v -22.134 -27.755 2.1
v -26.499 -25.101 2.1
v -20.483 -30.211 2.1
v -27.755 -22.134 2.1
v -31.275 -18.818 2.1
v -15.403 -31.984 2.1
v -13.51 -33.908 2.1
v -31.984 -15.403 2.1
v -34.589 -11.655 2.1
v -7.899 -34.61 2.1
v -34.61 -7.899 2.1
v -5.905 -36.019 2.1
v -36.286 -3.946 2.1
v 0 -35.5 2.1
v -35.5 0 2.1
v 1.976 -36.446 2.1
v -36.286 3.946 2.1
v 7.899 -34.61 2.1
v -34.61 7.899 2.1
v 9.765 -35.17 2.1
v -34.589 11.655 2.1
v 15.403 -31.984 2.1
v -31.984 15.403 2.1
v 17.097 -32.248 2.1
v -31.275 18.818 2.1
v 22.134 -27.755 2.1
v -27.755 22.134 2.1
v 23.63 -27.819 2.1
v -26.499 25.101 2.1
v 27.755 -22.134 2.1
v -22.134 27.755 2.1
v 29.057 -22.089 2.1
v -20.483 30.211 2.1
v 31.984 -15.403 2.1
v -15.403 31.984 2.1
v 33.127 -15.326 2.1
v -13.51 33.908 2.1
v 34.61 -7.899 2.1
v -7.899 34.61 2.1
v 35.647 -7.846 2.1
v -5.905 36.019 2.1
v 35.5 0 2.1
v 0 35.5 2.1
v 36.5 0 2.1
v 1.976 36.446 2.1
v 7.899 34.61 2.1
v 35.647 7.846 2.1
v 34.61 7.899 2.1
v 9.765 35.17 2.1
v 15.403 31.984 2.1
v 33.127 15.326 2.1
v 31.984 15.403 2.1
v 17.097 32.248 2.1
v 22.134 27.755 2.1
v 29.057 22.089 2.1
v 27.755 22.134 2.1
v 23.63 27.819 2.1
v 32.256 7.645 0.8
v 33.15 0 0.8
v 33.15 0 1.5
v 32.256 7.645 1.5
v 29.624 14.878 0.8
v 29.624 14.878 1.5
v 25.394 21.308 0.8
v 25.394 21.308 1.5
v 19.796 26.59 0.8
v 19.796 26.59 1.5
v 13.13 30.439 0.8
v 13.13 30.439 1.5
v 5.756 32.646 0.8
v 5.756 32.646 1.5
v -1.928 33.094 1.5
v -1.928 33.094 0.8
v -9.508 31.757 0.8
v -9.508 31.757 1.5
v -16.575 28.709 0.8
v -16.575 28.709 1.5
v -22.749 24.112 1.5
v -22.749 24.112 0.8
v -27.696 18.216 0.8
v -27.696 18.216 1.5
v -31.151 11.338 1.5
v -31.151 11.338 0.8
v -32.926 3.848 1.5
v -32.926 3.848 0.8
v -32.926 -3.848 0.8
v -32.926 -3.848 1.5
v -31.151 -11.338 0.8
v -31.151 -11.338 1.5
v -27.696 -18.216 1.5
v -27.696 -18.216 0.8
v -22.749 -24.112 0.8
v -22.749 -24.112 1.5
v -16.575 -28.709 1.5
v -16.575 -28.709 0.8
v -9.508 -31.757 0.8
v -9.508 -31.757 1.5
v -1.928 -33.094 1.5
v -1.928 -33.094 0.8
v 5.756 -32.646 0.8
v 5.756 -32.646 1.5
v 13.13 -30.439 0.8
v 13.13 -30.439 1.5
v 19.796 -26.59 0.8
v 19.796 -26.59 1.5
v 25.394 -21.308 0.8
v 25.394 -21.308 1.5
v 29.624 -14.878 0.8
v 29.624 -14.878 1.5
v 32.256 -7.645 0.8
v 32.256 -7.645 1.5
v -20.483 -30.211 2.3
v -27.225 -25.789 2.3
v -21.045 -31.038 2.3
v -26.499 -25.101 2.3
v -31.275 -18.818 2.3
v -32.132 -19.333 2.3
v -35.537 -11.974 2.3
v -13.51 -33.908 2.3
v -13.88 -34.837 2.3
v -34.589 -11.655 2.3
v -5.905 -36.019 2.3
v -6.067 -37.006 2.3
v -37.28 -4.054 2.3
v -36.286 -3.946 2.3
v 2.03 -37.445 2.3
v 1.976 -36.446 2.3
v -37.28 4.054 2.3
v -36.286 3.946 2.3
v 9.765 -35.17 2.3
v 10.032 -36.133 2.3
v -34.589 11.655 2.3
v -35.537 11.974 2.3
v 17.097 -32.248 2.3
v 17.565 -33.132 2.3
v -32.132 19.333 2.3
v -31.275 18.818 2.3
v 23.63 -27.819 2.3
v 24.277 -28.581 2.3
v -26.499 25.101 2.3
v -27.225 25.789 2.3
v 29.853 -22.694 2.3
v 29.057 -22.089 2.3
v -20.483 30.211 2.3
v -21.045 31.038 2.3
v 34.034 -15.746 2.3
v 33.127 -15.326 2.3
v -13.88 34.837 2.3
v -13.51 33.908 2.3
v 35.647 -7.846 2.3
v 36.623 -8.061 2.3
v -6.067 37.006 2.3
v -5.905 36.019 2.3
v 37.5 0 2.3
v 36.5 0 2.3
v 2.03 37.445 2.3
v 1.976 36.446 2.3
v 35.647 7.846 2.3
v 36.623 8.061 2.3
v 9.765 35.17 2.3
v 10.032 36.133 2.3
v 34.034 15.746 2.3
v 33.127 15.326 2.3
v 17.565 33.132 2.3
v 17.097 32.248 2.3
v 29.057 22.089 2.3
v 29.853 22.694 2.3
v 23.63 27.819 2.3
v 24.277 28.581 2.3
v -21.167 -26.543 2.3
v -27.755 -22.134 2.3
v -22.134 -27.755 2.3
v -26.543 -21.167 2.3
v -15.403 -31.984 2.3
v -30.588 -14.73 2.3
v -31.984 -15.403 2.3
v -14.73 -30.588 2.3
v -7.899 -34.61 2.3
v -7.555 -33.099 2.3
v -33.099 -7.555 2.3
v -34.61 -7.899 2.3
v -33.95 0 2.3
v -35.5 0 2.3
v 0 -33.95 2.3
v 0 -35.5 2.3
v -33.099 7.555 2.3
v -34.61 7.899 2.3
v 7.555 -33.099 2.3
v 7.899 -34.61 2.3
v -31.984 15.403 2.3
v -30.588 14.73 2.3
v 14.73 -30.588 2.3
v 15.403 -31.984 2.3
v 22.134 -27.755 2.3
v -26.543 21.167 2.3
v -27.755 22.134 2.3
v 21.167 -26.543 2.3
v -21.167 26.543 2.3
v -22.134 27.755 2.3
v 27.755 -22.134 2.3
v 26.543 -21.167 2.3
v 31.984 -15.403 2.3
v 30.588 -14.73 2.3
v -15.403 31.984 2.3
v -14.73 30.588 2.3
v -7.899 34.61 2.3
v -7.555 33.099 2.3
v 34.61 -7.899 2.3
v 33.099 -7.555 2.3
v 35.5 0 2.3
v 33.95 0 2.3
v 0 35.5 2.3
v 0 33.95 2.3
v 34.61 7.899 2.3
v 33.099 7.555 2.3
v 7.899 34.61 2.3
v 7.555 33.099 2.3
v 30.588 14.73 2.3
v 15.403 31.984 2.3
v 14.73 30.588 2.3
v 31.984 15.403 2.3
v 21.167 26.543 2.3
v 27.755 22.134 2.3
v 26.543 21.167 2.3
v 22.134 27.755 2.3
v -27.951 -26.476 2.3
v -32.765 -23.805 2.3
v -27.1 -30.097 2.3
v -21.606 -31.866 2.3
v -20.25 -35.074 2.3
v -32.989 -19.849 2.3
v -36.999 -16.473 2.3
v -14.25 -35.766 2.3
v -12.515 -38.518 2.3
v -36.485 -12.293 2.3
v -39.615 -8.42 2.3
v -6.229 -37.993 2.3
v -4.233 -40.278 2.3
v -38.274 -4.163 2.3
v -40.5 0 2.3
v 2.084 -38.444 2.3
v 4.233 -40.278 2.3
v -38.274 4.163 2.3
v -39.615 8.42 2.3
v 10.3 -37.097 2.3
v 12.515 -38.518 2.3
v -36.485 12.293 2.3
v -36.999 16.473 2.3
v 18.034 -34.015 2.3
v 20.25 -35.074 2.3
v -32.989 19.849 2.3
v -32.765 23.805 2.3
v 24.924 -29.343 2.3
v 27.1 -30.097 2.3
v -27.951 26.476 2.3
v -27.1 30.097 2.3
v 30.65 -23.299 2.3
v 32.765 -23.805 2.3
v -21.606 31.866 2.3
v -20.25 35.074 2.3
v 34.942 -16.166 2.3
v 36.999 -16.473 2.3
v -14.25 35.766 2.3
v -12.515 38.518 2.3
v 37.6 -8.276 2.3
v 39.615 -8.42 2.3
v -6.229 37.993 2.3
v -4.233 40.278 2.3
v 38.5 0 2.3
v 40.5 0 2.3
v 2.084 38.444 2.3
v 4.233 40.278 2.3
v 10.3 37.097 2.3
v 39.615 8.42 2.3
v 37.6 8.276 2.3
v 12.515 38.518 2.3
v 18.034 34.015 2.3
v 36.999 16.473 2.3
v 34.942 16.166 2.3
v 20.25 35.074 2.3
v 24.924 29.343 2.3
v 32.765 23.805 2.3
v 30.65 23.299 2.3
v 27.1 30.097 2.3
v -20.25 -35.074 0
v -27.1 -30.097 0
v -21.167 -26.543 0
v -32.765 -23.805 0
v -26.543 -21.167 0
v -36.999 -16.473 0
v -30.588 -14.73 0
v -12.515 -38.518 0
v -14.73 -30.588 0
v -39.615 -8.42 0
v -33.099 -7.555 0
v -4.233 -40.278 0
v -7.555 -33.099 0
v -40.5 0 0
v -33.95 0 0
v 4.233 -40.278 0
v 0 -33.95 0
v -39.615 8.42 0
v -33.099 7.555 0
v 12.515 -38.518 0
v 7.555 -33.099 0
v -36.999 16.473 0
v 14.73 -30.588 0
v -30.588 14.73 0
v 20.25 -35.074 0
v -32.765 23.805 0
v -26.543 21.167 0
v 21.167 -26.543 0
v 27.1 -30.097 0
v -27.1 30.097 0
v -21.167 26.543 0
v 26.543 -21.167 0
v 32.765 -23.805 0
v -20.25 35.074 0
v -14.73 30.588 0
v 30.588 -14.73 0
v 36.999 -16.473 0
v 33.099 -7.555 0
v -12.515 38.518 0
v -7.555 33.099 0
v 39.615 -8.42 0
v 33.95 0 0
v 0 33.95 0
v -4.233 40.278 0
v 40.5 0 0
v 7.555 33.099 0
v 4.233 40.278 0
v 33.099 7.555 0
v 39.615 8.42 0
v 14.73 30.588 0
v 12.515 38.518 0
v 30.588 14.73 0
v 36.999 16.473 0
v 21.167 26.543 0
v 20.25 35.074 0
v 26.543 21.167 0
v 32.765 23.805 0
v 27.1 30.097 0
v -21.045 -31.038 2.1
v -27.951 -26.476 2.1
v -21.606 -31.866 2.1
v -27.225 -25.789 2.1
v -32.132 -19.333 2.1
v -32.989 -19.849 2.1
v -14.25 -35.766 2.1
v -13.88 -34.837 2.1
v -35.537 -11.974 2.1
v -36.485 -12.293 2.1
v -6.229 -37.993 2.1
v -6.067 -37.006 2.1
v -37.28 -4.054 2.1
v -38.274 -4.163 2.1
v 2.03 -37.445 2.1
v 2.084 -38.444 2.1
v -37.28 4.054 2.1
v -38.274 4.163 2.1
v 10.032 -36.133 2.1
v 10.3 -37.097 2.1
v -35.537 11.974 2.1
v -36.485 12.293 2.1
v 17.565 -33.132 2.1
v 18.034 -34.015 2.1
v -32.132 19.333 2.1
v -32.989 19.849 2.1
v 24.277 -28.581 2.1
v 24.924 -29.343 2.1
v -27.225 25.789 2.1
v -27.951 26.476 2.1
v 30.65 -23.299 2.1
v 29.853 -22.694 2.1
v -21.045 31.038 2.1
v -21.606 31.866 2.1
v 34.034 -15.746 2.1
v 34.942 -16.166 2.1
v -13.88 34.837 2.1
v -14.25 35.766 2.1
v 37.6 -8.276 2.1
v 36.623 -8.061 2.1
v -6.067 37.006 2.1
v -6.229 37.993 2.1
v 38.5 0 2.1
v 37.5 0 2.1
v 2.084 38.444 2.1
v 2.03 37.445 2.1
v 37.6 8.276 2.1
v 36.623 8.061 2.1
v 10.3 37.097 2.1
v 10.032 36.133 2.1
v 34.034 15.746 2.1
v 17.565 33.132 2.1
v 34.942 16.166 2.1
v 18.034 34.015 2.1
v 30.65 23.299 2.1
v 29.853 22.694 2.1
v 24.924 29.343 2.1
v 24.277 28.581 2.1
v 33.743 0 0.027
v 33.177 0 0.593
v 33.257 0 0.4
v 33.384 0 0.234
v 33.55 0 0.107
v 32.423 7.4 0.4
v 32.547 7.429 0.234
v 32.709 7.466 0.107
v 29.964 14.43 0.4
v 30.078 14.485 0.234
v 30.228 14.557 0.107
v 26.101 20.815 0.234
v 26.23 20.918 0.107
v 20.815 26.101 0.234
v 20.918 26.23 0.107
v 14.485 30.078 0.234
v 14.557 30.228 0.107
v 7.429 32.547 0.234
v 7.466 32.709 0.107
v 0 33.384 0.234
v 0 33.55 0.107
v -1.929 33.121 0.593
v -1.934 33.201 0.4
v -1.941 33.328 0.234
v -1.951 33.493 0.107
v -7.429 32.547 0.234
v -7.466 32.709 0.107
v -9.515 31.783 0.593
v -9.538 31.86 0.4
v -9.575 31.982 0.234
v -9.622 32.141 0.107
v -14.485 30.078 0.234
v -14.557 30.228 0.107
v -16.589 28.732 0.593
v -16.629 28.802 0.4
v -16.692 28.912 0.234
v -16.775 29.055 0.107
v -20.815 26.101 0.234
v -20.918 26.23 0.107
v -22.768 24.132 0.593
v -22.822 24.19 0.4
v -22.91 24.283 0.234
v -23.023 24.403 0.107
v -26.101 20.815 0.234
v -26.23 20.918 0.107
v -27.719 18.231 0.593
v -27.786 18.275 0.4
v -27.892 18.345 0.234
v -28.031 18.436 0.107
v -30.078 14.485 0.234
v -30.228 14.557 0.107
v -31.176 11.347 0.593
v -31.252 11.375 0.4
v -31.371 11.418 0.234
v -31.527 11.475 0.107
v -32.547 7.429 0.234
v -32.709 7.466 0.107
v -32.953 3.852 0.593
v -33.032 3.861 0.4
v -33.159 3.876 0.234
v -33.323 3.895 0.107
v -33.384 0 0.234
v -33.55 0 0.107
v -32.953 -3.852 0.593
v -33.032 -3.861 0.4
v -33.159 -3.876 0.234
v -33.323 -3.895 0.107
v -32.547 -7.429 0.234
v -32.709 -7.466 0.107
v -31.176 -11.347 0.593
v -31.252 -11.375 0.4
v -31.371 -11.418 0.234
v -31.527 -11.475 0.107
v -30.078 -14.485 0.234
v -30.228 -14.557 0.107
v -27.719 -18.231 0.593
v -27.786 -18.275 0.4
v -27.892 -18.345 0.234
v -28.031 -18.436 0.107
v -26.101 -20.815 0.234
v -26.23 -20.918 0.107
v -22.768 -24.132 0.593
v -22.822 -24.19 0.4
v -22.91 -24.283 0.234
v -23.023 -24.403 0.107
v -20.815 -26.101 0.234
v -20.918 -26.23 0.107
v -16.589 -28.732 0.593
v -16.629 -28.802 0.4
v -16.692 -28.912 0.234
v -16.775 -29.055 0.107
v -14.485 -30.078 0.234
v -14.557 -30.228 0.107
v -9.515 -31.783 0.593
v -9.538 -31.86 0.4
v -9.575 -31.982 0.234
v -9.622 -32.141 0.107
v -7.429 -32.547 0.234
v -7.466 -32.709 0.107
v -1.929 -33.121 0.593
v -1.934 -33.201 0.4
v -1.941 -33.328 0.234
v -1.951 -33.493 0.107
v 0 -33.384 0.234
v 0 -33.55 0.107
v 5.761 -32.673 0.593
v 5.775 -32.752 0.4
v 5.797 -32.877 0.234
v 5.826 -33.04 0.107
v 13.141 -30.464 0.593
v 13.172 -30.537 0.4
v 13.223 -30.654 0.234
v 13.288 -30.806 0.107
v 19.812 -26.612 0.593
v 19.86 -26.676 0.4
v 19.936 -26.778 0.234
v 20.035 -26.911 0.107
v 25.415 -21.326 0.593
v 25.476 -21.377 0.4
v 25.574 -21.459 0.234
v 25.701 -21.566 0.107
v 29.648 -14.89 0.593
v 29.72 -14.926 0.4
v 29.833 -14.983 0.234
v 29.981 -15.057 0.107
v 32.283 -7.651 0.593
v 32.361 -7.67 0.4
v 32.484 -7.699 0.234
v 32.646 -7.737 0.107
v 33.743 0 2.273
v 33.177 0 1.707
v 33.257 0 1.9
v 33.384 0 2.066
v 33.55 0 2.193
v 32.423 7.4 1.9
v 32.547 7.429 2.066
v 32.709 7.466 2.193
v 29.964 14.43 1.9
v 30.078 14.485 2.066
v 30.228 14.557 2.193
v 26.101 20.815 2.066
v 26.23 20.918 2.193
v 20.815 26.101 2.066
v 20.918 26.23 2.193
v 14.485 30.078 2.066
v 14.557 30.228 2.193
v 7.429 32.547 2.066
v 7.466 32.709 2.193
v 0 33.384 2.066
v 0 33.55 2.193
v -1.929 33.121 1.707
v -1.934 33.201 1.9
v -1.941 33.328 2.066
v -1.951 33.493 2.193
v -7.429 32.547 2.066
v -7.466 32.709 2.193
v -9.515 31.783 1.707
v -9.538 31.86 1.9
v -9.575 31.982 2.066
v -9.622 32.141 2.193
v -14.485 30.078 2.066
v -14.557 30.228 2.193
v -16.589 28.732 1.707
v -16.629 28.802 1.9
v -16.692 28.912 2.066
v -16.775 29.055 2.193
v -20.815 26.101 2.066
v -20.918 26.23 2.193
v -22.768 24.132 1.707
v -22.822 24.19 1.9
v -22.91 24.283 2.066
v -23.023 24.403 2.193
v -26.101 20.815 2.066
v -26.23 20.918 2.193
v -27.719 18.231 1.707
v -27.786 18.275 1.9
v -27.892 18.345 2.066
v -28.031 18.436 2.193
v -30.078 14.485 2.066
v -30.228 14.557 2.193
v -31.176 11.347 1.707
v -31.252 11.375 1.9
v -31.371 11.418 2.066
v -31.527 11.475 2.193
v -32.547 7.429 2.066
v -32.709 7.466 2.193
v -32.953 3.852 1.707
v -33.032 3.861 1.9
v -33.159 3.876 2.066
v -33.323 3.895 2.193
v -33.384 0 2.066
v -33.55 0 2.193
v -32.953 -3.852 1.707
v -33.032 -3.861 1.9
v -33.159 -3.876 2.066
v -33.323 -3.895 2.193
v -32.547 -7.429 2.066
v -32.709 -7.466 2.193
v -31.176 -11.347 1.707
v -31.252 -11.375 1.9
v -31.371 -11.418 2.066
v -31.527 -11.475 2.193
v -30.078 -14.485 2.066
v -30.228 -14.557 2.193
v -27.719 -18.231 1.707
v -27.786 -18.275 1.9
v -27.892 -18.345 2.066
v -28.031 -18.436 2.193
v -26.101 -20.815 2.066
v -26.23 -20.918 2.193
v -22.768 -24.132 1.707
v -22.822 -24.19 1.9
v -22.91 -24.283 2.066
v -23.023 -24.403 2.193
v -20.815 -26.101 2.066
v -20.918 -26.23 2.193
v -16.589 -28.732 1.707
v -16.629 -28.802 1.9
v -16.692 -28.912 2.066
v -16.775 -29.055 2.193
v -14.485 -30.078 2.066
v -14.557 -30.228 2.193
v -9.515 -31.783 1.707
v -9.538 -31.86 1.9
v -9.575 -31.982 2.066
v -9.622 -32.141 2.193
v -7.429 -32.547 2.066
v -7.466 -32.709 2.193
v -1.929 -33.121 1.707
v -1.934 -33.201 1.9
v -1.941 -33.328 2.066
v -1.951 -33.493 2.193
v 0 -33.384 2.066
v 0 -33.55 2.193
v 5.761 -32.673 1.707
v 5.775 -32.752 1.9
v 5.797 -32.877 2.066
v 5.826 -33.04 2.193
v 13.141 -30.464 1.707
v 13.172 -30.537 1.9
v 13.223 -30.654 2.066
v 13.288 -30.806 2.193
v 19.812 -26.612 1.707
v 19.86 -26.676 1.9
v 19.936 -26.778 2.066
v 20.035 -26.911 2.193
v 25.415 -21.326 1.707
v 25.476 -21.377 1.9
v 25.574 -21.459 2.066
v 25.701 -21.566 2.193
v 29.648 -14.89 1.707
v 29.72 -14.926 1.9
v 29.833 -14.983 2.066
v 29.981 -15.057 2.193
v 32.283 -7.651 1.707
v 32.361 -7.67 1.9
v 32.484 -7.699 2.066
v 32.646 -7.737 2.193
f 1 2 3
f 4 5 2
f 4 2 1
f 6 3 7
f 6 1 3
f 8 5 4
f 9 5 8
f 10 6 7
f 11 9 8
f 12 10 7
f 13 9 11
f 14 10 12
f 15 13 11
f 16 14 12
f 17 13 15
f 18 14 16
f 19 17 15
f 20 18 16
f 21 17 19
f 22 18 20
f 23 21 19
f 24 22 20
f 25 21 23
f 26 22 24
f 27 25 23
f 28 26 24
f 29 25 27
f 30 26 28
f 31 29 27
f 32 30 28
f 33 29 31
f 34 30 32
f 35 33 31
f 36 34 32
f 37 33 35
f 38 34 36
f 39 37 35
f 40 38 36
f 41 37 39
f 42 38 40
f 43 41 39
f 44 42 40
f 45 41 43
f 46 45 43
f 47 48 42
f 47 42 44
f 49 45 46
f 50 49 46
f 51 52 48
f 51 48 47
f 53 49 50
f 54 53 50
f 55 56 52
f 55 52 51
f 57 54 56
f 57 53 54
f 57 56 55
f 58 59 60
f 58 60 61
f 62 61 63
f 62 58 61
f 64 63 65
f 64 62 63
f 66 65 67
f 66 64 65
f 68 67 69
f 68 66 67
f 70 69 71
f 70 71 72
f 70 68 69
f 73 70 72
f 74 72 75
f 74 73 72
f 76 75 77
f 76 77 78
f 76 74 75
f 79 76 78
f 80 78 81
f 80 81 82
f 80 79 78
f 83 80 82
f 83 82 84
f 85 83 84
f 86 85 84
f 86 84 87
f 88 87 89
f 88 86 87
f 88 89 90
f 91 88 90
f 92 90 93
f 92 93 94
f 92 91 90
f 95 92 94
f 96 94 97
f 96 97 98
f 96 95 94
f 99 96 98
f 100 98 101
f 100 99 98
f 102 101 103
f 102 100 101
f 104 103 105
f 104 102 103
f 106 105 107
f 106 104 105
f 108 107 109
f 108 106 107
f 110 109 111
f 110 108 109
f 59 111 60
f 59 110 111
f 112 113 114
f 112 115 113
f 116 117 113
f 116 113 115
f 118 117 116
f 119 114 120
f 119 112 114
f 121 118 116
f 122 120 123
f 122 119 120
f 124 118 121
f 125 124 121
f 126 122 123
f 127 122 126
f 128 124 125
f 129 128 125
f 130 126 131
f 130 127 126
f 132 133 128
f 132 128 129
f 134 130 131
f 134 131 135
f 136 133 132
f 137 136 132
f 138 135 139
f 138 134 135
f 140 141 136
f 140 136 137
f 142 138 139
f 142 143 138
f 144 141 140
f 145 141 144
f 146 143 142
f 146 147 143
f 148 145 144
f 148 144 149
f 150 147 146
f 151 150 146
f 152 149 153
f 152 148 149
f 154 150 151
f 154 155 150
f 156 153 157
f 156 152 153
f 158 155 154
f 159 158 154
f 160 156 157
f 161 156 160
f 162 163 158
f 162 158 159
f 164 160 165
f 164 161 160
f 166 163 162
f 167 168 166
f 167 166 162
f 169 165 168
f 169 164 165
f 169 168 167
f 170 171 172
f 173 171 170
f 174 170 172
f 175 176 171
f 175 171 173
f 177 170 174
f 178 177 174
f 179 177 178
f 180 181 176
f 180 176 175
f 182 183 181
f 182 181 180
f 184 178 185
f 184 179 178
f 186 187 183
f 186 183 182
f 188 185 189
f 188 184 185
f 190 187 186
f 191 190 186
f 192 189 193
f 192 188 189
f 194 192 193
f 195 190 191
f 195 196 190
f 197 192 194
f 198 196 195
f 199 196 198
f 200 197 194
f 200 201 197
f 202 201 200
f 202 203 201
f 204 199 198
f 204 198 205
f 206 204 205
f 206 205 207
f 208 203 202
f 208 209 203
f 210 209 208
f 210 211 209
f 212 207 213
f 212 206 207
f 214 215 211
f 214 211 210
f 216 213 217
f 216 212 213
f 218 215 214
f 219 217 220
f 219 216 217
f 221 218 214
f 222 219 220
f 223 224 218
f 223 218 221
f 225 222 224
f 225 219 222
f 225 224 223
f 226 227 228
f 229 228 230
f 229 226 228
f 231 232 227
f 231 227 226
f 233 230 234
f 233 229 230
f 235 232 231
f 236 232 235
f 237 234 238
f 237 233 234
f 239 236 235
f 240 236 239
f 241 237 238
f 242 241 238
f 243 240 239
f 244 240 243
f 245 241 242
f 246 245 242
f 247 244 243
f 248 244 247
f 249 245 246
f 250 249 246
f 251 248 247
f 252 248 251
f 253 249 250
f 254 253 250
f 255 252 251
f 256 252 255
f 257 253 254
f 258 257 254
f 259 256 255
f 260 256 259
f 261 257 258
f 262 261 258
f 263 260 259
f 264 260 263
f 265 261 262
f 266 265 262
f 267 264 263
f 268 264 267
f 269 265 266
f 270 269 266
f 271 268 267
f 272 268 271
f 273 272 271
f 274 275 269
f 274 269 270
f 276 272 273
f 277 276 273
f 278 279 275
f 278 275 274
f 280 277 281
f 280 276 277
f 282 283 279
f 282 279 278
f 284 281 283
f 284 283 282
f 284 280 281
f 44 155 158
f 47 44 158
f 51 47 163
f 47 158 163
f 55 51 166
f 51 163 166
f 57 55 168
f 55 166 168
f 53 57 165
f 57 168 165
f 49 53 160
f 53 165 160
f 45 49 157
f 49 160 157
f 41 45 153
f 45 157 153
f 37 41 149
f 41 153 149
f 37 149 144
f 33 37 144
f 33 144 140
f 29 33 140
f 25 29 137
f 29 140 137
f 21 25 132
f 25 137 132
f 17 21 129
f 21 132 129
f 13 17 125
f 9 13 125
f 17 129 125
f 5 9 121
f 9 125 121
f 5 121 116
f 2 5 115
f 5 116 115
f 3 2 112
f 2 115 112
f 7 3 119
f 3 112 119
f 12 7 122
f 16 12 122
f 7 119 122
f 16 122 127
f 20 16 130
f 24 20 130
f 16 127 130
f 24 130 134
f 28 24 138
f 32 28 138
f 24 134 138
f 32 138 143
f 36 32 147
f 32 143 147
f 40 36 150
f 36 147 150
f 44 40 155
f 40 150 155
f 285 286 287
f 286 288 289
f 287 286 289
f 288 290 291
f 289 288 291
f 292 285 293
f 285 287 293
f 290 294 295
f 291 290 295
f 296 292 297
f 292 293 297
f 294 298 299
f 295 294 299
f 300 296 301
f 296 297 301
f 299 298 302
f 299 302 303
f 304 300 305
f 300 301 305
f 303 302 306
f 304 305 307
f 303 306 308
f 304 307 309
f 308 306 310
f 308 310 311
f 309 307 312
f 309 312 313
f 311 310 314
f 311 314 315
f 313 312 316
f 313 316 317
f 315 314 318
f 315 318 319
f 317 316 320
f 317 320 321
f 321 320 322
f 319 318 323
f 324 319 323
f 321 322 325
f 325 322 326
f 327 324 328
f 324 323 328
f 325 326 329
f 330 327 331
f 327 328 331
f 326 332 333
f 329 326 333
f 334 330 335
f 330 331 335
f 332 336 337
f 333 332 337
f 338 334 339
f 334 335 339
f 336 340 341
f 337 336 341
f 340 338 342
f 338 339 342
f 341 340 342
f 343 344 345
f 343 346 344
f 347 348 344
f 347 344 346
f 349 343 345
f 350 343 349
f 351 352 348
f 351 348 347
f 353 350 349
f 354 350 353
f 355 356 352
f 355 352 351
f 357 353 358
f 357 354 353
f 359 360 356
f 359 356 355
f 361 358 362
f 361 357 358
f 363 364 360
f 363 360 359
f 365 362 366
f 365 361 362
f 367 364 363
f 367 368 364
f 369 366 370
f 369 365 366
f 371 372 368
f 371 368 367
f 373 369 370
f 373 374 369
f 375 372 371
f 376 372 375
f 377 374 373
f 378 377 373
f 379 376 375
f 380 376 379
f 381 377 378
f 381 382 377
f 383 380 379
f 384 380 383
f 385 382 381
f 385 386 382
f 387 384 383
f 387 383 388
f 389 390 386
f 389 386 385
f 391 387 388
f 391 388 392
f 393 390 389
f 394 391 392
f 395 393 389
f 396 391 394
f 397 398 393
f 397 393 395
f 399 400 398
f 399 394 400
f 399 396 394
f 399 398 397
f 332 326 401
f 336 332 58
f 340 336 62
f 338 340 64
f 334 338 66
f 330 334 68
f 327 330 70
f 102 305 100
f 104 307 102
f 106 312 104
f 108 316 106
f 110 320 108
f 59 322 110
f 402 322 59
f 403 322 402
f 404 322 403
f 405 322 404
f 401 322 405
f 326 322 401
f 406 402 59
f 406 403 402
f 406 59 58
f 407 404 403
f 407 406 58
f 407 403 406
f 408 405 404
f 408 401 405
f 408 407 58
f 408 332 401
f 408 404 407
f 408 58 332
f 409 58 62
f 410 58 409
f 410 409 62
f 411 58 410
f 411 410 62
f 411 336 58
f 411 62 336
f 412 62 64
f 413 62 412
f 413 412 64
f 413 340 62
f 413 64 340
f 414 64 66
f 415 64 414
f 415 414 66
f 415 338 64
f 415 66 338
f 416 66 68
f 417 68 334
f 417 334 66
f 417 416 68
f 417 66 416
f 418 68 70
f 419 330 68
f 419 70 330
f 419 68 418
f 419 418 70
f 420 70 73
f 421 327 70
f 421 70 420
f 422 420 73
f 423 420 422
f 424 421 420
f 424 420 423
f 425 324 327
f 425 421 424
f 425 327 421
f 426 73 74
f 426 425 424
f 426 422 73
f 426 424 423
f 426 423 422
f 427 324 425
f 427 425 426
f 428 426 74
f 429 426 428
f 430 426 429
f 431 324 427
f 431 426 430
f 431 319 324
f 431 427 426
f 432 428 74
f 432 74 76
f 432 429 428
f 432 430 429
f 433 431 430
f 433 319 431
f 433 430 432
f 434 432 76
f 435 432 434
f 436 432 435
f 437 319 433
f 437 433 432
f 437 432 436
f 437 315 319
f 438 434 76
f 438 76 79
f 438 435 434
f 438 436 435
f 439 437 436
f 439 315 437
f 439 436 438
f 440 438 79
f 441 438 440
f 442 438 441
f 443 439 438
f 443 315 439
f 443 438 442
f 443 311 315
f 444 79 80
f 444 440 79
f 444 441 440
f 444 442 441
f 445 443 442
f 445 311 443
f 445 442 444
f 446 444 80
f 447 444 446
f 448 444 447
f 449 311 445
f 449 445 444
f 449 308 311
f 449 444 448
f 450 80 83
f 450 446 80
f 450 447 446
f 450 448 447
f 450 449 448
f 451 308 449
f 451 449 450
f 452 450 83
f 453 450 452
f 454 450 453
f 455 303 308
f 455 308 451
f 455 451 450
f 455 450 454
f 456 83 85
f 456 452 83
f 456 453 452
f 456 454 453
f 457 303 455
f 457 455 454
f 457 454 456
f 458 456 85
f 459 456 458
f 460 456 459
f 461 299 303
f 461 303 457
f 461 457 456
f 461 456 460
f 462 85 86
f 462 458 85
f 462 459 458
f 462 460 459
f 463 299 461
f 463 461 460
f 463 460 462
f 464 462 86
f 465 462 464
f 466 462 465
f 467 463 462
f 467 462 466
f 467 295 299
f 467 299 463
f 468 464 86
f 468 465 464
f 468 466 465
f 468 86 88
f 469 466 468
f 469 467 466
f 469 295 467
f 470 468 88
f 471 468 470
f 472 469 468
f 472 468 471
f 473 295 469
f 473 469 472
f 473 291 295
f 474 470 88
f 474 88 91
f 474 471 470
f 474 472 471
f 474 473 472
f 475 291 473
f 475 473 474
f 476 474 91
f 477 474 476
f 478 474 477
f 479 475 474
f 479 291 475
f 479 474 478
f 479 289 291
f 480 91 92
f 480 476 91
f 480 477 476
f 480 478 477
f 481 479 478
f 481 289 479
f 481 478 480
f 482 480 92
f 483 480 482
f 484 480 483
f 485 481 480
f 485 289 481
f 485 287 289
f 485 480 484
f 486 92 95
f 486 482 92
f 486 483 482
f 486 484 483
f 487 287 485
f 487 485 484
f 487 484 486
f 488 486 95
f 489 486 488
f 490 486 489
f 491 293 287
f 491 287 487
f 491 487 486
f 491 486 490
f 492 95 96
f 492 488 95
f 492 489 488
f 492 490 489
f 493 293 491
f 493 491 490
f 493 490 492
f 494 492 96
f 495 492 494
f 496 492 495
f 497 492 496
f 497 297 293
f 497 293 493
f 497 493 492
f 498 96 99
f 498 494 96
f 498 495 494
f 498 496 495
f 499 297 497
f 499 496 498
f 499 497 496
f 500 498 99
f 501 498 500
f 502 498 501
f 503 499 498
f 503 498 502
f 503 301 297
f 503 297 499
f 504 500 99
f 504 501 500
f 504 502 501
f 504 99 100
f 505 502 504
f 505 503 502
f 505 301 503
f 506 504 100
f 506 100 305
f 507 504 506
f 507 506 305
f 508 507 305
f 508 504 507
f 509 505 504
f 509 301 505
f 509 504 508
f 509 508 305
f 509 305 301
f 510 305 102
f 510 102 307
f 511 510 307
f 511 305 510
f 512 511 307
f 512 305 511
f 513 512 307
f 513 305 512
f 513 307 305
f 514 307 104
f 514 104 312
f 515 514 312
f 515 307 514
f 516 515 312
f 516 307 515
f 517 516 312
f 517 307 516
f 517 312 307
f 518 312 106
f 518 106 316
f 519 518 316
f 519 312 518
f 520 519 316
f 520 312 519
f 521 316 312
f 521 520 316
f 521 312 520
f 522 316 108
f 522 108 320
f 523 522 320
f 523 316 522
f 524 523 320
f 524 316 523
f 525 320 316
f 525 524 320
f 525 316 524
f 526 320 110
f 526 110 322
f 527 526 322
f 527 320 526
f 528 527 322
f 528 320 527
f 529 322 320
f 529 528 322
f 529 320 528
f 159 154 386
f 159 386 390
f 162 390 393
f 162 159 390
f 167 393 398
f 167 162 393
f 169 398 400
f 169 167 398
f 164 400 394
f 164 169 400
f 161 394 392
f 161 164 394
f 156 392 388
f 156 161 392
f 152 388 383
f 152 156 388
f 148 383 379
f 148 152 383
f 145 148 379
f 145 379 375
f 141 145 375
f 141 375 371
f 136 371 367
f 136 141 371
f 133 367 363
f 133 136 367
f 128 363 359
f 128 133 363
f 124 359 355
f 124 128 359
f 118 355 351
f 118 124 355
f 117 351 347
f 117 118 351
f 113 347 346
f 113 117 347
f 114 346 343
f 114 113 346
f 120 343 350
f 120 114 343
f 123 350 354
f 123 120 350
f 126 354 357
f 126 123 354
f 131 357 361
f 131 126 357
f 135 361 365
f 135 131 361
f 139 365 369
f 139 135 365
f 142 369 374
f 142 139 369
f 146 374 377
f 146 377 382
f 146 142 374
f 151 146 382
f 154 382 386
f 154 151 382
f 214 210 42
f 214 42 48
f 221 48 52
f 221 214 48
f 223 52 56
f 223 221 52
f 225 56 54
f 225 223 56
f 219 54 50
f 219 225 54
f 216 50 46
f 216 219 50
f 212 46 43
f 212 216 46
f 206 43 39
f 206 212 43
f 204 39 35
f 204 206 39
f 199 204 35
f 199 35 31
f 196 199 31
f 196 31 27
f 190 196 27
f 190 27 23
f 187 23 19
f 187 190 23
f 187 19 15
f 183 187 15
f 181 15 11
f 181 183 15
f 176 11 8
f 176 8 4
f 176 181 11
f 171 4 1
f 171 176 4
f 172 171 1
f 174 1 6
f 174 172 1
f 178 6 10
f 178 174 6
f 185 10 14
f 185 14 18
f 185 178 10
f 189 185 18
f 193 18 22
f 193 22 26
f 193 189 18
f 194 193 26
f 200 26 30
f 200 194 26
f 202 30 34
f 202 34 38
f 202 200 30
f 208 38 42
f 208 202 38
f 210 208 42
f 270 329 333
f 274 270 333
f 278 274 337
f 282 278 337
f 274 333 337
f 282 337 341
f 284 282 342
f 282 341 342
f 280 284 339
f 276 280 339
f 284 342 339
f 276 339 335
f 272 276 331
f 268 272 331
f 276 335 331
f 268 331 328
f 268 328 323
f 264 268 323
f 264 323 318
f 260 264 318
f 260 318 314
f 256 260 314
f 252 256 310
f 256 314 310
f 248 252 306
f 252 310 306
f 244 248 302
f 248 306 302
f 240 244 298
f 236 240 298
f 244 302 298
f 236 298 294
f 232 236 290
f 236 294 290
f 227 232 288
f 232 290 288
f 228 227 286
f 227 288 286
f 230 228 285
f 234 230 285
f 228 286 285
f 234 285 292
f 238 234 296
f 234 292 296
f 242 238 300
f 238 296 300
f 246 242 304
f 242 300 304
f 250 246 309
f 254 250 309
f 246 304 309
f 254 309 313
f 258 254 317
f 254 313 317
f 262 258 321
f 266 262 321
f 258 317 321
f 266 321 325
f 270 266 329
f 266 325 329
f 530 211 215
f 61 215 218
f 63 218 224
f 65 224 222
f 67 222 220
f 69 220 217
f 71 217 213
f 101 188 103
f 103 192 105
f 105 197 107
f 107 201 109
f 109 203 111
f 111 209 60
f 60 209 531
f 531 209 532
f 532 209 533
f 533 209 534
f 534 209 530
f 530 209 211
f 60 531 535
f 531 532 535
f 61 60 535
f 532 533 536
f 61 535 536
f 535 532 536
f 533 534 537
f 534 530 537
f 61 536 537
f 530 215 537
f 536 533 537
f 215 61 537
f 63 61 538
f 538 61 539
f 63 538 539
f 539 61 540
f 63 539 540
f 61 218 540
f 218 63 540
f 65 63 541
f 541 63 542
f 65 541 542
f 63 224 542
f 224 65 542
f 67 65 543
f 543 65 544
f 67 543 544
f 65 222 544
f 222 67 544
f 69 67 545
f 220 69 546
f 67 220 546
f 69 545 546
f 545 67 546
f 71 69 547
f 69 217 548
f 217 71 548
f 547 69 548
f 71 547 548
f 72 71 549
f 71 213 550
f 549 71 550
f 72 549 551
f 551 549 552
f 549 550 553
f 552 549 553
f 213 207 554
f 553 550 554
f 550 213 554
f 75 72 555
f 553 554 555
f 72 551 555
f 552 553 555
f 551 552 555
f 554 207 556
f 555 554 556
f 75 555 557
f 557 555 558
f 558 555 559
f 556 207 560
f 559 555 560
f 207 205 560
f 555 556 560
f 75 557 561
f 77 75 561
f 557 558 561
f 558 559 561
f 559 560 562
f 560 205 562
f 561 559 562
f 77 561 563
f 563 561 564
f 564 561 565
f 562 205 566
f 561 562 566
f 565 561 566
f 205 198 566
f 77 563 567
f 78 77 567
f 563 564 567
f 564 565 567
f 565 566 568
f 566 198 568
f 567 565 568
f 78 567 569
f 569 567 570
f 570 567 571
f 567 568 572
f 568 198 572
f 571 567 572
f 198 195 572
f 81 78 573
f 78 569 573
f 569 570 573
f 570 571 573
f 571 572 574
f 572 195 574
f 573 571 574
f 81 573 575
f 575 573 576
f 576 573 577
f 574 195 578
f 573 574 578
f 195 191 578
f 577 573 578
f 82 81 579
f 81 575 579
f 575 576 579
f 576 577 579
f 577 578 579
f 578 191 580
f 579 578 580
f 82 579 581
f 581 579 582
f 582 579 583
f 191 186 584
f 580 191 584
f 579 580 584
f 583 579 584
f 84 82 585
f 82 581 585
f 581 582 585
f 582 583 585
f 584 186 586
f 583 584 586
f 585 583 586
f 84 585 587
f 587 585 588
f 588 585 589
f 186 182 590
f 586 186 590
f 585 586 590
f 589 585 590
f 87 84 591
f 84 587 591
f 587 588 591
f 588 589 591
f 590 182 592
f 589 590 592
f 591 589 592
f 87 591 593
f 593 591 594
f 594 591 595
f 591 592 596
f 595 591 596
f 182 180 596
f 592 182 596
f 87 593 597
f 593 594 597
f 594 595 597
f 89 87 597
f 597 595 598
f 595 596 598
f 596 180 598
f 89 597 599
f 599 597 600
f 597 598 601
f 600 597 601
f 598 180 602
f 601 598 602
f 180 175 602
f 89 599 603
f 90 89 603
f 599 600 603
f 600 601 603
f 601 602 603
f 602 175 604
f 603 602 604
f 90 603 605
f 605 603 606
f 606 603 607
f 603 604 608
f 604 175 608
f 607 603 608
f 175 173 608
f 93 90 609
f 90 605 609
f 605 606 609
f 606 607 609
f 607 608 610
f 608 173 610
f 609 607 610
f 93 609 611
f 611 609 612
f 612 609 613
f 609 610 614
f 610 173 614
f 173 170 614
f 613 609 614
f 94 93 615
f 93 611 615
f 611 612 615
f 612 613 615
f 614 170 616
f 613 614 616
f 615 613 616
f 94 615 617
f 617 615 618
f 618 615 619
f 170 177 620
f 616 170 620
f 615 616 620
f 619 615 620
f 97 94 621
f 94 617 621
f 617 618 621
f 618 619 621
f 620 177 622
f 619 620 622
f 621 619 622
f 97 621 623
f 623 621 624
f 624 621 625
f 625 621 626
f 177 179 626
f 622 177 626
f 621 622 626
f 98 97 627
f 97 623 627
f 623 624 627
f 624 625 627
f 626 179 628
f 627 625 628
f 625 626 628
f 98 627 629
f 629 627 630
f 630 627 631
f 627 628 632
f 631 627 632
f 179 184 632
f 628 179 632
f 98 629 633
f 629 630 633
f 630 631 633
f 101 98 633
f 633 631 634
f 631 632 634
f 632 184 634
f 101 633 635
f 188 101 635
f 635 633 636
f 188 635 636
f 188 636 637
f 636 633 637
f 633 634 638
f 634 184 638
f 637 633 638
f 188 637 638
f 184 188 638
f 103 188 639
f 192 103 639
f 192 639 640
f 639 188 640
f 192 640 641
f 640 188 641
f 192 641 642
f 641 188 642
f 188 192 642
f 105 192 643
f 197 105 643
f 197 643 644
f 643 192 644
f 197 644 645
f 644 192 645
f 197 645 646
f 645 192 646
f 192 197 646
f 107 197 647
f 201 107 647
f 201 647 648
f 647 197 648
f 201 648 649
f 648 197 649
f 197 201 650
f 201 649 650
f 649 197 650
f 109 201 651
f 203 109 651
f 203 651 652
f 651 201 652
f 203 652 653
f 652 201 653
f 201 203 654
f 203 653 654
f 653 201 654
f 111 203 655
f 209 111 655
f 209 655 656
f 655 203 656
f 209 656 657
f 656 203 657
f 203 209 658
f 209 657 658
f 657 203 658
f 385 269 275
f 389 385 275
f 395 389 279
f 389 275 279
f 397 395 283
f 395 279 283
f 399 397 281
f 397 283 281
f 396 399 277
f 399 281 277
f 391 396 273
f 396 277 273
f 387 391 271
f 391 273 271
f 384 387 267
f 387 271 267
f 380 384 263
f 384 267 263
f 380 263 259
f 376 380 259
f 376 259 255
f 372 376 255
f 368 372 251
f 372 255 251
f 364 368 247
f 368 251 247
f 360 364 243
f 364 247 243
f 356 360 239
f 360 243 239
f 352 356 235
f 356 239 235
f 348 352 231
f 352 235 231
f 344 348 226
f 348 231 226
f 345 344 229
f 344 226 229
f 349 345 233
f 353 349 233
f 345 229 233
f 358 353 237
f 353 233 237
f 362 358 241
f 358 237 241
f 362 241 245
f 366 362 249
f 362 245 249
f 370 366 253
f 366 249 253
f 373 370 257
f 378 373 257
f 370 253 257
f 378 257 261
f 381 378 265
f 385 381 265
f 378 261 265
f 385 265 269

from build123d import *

# Parameters (mm, degrees)
F0_R     = 40.5
F0_R_2   = 33.15
F1_DEPTH = 2.3
F2_R     = 0.8
F3_R     = 38.5
F3_R_2   = 37.5
F3_R_3   = 36.5
F3_R_4   = 35.5
F4_DEPTH = 0.2


with BuildPart() as f1:
    # F0 (on Top) → F1 (new body)
    with BuildSketch(Plane.XY):
        Circle(F0_R)
        Circle(F0_R_2, mode=Mode.SUBTRACT)
    extrude(amount=F1_DEPTH)

    # F2
    f2_edges = [f1.edges().sort_by_distance(p)[0] for p in [
        (-33.15, 0, 2.3),
        (-33.15, 0, 0),
    ]]
    fillet(f2_edges, radius=F2_R)

    # F3 (on face) → F4 (cut)
    with BuildSketch(Plane.XY.offset(2.3)):
        Circle(F3_R)
        Circle(F3_R_2, mode=Mode.SUBTRACT)
        Circle(F3_R_3)
        Circle(F3_R_4, mode=Mode.SUBTRACT)
    extrude(amount=-F4_DEPTH, mode=Mode.SUBTRACT)


solid = f1.part
